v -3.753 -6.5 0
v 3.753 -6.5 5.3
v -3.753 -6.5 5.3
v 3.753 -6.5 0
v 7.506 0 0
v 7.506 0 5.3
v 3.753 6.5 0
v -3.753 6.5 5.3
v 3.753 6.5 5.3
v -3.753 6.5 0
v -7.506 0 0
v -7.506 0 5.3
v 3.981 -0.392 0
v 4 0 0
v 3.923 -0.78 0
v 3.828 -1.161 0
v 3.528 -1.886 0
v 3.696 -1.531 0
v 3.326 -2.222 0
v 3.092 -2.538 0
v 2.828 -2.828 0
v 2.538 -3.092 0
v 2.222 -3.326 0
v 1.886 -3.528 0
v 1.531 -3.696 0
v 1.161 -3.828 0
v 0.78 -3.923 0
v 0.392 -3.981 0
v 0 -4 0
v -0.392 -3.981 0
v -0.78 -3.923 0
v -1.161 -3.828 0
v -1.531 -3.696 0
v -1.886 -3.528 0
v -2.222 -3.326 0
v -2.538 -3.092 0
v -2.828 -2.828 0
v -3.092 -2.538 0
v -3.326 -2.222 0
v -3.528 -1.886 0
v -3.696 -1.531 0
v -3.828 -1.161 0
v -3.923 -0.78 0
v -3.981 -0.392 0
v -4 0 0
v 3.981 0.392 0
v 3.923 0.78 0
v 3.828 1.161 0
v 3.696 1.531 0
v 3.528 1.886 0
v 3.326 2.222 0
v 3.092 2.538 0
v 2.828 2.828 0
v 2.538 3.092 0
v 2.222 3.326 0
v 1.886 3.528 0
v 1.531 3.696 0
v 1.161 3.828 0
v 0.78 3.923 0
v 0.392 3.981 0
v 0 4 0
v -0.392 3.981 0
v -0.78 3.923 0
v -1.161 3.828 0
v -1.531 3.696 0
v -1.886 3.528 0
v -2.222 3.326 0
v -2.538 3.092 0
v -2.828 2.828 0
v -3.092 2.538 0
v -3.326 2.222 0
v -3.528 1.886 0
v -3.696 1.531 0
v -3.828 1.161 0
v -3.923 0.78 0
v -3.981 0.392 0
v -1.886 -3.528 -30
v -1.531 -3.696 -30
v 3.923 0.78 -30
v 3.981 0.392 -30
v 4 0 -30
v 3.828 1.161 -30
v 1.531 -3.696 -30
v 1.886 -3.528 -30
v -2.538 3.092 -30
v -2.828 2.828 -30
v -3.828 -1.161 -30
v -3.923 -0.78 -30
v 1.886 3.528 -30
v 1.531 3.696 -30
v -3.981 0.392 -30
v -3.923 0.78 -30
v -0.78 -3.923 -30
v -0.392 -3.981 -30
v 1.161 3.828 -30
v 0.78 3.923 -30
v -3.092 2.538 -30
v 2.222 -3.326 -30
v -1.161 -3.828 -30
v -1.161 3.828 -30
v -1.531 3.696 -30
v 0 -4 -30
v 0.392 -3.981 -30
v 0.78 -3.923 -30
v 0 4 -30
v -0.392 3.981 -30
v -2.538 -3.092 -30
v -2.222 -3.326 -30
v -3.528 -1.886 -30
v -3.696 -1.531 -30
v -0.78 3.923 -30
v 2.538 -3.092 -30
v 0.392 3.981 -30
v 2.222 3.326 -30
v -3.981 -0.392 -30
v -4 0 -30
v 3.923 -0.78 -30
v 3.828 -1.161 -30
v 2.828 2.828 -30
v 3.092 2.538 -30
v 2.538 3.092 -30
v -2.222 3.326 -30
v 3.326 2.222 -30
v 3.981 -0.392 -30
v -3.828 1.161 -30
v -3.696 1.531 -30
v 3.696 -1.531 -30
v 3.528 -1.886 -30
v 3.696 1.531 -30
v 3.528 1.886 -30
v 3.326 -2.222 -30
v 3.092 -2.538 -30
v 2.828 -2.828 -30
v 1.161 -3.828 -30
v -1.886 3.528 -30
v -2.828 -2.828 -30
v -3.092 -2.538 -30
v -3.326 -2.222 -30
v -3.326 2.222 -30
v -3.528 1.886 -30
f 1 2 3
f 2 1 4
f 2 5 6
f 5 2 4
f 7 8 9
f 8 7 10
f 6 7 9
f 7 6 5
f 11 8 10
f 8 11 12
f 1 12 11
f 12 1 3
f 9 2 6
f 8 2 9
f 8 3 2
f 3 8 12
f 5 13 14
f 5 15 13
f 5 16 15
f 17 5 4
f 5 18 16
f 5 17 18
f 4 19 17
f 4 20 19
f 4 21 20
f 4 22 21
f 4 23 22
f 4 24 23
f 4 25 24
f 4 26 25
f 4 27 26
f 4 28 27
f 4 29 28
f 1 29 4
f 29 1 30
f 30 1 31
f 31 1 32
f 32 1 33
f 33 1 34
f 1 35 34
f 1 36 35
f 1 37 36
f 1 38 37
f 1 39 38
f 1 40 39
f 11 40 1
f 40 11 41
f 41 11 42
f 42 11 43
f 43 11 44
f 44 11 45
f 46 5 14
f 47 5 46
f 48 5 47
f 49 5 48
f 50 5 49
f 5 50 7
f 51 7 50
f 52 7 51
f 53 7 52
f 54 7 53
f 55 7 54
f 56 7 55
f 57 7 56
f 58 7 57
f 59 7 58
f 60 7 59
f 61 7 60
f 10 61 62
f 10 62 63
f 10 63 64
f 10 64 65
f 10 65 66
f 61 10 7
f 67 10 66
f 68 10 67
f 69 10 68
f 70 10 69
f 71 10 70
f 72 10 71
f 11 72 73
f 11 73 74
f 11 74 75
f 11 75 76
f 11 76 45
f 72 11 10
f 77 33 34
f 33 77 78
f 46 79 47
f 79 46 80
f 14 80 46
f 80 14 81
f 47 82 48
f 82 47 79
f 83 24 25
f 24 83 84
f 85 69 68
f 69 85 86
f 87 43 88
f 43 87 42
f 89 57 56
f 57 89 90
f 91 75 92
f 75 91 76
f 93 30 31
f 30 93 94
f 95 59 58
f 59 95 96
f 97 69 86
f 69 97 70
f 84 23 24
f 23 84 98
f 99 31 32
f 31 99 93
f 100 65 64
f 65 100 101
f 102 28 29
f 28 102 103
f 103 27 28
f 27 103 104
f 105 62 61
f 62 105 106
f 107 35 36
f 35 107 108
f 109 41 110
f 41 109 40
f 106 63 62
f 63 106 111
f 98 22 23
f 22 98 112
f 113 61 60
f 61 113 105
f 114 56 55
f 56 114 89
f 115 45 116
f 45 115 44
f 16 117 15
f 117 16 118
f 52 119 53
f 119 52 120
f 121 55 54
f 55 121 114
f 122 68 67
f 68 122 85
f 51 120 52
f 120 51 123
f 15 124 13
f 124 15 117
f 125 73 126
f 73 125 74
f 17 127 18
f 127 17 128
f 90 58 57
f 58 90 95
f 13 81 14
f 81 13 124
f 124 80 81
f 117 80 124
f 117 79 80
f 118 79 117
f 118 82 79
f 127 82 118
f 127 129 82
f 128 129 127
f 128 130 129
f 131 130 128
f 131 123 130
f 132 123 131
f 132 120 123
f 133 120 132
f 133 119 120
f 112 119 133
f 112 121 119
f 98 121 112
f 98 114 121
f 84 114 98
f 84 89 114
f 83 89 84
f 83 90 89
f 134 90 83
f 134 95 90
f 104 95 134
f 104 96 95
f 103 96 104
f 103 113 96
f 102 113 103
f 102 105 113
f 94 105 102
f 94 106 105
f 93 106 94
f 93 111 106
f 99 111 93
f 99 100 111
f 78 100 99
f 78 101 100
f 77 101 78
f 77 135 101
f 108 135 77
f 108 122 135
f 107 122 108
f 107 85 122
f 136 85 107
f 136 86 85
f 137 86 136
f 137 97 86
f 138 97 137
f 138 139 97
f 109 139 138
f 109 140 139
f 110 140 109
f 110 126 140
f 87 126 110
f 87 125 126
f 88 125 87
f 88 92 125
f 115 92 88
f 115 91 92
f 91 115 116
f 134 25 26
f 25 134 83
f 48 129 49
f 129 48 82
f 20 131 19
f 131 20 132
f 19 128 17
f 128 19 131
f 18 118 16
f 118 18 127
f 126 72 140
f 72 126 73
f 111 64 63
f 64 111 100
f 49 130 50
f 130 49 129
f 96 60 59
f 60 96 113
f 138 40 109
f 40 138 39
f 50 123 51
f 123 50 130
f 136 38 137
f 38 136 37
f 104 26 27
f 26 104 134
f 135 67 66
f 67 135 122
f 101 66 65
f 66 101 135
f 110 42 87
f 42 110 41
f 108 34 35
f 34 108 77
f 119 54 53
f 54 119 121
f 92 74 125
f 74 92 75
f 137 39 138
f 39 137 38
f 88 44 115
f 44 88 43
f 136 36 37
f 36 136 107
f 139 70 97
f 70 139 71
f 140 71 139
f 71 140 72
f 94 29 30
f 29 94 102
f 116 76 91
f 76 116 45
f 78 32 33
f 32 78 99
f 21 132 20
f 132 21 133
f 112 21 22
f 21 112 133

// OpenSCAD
// M8 六角ボルト（ねじ山省略）
// 単位: mm

across_flats = 13;
head_height  = 5.3;
shank_diameter = 8;
shank_length   = 30;

// 六角形の外接円半径: 対辺距離 / √3
head_radius = across_flats / sqrt(3);

union() {
    // 頭部: 底面 z=0、+Z 方向へ配置
    cylinder(
        h = head_height,
        r = head_radius,
        $fn = 6
    );

    // シャンク: z=0 から -Z 方向へ配置
    translate([0, 0, -shank_length])
        cylinder(
            h = shank_length,
            d = shank_diameter,
            $fn = 64
        );
}
